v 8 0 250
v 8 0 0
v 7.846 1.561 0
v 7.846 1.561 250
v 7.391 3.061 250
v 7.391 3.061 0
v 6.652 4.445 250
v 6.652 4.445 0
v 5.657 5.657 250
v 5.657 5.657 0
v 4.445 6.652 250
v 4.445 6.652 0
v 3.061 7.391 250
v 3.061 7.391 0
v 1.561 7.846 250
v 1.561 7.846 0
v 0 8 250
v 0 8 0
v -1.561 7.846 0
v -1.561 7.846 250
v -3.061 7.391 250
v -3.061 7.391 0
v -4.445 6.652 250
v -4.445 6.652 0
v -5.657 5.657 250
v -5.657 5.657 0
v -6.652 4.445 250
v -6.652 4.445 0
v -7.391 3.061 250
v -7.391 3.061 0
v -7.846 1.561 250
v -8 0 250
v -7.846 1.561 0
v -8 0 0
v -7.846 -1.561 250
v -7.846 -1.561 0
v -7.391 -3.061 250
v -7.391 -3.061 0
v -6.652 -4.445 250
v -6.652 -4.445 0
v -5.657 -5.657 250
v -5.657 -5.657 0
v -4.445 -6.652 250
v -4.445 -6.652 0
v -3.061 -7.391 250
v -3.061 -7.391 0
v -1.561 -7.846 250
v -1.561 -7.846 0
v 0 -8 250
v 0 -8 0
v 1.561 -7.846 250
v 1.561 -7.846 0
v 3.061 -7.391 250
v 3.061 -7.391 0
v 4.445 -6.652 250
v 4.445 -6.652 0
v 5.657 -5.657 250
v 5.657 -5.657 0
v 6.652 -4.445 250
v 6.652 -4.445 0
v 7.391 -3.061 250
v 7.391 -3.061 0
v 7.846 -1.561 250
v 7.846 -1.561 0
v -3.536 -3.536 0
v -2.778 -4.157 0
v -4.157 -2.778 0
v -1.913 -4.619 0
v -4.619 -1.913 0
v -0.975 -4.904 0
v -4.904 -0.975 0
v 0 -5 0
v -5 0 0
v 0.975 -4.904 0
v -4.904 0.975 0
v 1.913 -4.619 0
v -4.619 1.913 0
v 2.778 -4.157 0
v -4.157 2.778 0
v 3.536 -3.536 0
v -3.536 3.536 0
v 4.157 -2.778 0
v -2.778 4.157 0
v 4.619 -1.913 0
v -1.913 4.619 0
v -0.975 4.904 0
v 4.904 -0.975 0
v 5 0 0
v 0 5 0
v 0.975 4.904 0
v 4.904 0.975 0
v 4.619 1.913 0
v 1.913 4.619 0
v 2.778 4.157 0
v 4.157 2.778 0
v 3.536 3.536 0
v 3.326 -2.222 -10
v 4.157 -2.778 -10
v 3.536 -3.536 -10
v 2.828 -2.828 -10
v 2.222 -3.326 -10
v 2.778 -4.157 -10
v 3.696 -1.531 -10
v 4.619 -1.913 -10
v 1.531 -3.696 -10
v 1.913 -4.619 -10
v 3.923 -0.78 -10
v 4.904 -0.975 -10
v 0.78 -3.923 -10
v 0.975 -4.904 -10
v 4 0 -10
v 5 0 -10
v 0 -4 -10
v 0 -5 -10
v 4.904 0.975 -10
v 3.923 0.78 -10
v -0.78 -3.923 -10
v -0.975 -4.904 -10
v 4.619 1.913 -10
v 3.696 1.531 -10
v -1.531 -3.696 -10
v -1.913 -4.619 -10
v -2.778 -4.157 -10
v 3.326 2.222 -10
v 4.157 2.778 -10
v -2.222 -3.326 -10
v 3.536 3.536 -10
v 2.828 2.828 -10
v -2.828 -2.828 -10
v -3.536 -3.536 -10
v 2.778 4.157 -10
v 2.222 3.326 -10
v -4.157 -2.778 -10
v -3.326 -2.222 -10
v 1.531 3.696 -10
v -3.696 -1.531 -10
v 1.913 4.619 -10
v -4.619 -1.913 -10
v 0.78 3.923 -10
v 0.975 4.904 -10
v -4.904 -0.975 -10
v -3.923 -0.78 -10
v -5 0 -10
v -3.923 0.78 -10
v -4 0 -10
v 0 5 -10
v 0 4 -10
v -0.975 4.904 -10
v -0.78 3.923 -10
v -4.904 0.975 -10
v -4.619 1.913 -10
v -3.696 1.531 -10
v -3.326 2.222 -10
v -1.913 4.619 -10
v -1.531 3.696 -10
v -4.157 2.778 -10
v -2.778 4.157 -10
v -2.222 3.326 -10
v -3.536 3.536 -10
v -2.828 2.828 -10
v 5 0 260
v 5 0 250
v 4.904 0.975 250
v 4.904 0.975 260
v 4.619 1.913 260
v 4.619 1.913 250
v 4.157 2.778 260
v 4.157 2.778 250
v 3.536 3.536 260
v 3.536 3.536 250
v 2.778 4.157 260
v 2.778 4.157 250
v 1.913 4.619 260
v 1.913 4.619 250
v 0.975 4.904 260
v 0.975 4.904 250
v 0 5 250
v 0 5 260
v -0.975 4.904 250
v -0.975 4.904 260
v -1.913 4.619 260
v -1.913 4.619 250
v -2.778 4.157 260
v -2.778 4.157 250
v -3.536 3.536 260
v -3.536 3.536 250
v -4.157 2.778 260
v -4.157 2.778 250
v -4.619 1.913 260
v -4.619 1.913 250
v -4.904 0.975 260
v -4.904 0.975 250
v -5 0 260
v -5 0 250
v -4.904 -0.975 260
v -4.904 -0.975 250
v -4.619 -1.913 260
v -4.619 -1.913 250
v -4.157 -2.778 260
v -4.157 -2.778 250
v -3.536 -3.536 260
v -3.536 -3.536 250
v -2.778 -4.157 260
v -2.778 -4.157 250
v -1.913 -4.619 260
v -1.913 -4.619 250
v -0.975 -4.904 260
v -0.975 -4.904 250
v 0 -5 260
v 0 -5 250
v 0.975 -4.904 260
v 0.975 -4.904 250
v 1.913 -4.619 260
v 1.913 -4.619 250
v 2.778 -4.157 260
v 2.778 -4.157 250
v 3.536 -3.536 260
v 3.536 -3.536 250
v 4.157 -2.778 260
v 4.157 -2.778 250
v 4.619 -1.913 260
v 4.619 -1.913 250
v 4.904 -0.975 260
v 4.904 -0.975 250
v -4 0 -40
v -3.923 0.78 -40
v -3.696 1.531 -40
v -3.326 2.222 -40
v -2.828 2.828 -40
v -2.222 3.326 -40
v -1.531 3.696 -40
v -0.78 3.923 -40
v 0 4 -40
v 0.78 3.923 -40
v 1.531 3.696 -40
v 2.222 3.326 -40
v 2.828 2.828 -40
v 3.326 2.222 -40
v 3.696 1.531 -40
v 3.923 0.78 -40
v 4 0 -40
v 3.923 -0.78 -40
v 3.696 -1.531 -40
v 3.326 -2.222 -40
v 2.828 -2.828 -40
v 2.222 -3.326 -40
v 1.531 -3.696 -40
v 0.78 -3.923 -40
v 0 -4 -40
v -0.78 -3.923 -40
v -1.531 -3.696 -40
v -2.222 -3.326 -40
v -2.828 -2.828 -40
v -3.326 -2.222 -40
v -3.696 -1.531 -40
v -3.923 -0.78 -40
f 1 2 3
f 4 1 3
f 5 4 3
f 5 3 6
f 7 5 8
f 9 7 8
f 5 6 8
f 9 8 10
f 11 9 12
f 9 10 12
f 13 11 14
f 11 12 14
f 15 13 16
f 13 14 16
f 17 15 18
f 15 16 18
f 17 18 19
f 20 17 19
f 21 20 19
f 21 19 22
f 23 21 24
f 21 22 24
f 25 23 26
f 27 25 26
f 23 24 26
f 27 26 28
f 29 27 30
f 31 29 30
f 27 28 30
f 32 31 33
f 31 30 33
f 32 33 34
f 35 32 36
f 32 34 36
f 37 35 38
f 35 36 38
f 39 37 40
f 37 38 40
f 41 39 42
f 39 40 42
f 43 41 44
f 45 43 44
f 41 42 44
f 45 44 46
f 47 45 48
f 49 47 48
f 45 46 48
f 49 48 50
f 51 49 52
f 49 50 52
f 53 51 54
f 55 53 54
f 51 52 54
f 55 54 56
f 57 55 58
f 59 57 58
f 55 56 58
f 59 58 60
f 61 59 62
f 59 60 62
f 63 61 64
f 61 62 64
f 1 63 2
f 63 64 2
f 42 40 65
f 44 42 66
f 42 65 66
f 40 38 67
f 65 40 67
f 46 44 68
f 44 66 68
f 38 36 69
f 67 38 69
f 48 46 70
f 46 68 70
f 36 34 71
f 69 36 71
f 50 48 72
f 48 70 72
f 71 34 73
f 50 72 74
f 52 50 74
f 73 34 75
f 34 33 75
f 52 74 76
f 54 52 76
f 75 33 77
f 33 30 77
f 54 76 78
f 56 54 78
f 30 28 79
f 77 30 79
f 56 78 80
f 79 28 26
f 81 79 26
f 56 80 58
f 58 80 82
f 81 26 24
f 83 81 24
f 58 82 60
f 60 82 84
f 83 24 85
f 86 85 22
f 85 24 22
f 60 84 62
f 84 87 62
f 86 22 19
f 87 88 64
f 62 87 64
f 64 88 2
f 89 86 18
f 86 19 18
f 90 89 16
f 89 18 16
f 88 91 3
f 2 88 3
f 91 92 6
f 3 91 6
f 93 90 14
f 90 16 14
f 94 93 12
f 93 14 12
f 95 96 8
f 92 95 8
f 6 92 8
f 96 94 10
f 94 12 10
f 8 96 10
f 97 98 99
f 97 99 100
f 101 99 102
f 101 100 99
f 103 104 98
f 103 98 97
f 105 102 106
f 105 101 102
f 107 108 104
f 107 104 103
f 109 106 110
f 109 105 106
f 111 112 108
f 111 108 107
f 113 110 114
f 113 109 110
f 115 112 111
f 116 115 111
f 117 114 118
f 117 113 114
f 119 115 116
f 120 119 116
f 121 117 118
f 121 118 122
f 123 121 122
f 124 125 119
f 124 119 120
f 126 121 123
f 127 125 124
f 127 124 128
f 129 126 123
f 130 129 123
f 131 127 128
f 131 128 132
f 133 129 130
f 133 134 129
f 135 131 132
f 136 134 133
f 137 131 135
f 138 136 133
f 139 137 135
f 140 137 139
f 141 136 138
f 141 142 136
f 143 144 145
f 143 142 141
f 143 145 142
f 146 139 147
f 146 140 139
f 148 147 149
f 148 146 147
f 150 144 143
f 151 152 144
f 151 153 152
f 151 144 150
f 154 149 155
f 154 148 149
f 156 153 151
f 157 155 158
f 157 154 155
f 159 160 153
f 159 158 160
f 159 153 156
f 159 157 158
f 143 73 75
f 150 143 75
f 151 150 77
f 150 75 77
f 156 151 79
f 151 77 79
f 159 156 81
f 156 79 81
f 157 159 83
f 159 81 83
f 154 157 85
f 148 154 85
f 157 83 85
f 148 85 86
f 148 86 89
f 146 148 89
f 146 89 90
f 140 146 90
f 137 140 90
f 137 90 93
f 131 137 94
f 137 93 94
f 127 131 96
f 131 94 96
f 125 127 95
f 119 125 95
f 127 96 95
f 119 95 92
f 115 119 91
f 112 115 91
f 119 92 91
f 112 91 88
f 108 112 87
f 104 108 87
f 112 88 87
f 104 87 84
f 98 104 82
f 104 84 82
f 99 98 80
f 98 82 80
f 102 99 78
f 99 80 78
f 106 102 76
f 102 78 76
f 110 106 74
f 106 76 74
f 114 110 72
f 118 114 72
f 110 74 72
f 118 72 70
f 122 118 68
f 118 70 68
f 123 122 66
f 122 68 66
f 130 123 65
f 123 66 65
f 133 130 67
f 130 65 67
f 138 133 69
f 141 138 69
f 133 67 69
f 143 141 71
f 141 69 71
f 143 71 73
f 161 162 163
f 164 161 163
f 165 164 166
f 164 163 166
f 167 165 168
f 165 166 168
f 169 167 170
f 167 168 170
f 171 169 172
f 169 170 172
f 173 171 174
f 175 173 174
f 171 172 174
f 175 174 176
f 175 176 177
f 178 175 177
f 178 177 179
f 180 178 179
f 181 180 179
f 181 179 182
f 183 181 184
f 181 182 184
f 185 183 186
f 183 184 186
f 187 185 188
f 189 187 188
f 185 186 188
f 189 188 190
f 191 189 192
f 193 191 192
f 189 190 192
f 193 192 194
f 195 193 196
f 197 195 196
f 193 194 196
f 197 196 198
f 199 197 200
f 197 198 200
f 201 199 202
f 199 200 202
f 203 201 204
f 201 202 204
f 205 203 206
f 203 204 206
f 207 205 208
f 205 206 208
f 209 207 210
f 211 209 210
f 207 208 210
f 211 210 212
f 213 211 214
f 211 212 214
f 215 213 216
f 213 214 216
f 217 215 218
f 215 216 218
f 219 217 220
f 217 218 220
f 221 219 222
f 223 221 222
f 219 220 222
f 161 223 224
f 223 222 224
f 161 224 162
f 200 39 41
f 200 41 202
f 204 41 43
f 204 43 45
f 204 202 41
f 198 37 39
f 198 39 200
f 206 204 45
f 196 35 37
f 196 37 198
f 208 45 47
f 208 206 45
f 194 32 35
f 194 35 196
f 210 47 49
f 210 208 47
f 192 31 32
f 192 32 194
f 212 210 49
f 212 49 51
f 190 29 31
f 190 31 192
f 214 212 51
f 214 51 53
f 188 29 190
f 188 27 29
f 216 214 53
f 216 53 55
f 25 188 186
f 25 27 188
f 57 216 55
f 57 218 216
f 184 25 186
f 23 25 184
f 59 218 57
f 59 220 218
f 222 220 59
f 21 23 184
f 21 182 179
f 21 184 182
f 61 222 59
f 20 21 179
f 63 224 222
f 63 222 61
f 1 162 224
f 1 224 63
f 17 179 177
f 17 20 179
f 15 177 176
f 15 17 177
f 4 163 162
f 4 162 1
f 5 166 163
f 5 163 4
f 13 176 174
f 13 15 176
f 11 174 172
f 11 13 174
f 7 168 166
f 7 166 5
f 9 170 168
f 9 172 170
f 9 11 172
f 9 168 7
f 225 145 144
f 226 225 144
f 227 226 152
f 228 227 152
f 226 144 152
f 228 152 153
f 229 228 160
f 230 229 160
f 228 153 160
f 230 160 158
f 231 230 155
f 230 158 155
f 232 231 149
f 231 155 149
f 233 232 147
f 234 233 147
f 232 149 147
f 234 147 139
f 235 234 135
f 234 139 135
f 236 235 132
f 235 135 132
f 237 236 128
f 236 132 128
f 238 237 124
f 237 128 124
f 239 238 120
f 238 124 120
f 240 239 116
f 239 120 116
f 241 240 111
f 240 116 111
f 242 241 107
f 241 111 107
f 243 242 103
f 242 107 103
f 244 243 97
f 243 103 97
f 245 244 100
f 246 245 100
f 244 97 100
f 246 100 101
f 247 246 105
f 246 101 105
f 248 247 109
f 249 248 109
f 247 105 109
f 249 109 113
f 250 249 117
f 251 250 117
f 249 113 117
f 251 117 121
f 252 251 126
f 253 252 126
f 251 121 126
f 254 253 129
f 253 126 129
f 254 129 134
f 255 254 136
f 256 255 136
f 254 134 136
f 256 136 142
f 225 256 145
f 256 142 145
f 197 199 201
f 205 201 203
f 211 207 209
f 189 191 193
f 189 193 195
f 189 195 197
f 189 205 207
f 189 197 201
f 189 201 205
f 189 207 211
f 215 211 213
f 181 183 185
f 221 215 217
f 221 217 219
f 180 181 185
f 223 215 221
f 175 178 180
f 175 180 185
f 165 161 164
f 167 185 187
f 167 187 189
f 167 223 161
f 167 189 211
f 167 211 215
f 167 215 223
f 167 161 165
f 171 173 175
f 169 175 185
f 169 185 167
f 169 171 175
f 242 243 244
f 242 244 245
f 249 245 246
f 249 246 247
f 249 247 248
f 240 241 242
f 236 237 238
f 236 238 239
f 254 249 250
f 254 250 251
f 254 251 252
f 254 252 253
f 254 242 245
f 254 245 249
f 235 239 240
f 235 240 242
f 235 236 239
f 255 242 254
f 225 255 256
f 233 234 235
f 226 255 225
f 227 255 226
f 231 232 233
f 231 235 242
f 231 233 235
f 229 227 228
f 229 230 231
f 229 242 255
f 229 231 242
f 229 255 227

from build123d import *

# Parameters (mm, degrees)
SKETCH1_R           = 8
BOSS_EXTRUDE1_DEPTH = 250
SKETCH2_R           = 5
BOSS_EXTRUDE2_DEPTH = 10
SKETCH3_R           = 5
BOSS_EXTRUDE3_DEPTH = 10
SKETCH4_R           = 4
BOSS_EXTRUDE4_DEPTH = 30


with BuildPart() as part:
    # Sketch1 → Boss-Extrude1 (new body)
    with BuildSketch(Plane.XY):
        Circle(SKETCH1_R)
    extrude(amount=BOSS_EXTRUDE1_DEPTH)

    # Sketch2 → Boss-Extrude2 (add)
    with BuildSketch(Plane.XY.offset(250)):
        Circle(SKETCH2_R)
    extrude(amount=BOSS_EXTRUDE2_DEPTH)

    # Sketch3 → Boss-Extrude3 (add)
    with BuildSketch(Plane(origin=(0, 0, 0), x_dir=(-1, 0, 0), z_dir=(0, 0, -1))):
        Circle(SKETCH3_R)
    extrude(amount=BOSS_EXTRUDE3_DEPTH)

    # Sketch4 → Boss-Extrude4 (add)
    with BuildSketch(Plane(origin=(0, 0, -10), x_dir=(-1, 0, 0), z_dir=(0, 0, -1))):
        Circle(SKETCH4_R)
    extrude(amount=BOSS_EXTRUDE4_DEPTH)


solid = part.part
